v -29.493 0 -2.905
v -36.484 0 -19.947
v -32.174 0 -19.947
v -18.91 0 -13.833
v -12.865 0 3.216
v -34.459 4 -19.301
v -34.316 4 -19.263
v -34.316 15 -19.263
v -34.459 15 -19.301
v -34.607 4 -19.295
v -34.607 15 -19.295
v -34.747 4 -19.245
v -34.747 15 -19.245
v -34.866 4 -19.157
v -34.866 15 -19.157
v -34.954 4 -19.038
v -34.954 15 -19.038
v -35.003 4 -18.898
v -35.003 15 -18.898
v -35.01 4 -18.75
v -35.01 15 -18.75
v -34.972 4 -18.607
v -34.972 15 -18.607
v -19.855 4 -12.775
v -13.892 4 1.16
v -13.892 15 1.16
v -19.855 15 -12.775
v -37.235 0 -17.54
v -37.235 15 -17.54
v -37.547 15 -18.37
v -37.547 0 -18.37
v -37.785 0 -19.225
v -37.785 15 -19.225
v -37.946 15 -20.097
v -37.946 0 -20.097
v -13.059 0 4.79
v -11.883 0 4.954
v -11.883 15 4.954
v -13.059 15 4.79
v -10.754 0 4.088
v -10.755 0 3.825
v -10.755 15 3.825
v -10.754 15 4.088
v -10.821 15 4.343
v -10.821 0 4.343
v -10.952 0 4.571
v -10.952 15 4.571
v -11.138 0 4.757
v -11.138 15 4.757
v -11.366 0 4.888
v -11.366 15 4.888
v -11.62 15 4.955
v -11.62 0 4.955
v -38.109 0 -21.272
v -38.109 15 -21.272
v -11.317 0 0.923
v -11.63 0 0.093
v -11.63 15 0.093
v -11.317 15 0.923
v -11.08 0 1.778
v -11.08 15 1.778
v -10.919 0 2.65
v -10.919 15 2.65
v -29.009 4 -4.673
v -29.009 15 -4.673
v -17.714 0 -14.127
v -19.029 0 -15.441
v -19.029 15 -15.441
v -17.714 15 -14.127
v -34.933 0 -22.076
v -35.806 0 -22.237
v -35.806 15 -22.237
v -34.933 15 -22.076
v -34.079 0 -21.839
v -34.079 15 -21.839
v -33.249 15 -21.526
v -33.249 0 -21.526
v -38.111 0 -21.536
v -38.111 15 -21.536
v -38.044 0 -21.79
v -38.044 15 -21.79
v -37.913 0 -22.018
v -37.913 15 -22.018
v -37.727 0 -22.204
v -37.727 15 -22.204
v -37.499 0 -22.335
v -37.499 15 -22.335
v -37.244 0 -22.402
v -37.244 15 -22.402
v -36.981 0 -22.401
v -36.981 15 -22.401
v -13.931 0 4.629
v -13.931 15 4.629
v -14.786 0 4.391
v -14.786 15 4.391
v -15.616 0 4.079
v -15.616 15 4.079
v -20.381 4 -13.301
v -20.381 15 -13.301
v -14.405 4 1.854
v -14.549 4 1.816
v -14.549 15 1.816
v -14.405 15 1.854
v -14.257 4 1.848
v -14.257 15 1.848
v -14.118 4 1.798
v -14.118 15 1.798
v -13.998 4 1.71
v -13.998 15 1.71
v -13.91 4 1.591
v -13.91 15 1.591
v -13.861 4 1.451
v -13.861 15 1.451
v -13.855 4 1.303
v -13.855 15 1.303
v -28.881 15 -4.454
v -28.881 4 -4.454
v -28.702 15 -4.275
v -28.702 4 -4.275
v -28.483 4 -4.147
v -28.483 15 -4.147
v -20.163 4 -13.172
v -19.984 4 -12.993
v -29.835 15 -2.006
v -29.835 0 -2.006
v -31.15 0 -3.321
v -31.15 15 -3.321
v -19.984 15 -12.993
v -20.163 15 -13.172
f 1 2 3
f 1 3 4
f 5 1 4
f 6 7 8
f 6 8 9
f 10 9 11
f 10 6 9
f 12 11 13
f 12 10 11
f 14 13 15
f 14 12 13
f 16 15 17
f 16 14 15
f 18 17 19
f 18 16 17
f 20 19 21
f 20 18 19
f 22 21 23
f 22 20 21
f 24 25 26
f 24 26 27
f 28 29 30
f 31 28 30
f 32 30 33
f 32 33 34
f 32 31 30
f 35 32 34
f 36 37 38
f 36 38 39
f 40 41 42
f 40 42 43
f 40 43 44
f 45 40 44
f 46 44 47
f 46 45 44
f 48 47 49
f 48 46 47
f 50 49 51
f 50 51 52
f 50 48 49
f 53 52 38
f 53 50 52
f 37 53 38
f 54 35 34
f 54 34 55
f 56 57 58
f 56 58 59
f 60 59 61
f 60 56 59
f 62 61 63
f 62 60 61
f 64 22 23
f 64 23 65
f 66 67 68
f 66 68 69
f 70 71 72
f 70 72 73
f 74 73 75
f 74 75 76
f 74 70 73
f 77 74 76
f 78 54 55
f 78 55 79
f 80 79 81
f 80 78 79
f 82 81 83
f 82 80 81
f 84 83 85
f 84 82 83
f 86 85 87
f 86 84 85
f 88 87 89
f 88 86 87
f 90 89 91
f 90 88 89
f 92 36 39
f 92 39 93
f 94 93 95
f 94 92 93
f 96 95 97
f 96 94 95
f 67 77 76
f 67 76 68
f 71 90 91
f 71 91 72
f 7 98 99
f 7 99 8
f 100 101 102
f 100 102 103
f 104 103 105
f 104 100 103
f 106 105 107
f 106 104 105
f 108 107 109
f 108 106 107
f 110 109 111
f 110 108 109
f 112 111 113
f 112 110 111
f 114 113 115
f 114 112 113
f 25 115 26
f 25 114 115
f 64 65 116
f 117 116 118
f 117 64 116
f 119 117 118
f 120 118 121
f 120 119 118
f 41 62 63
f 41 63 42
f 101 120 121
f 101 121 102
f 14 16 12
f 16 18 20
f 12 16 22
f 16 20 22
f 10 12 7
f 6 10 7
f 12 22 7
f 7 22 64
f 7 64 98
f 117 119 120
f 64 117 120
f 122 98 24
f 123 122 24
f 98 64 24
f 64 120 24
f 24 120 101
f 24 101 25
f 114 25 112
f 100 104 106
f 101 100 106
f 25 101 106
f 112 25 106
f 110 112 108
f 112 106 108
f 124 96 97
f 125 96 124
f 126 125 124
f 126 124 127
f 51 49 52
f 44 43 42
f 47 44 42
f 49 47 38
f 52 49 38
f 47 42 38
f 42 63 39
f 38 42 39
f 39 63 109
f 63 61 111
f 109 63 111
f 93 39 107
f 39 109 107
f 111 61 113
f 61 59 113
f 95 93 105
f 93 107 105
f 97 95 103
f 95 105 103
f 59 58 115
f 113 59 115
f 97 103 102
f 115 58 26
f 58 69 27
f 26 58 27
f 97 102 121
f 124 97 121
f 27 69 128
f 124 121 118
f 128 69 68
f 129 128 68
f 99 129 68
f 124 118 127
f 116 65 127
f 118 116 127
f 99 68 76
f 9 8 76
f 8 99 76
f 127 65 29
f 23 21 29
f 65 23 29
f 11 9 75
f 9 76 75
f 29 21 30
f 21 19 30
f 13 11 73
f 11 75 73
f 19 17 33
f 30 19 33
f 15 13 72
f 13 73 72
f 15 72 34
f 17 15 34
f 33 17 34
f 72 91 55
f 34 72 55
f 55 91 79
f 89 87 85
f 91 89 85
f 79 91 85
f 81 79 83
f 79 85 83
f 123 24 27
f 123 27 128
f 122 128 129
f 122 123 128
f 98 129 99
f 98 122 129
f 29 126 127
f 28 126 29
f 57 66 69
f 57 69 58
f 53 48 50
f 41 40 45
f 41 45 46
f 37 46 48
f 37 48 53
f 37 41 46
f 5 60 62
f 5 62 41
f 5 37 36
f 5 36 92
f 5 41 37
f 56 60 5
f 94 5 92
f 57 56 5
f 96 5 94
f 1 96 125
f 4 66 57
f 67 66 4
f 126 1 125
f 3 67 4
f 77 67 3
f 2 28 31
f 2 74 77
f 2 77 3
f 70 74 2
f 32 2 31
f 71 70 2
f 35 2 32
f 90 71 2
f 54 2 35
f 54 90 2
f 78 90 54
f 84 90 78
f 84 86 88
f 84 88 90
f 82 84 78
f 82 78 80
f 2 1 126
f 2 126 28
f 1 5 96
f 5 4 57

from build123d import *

# Parameters (mm, degrees)
BOSS_EXTRUDE1_DEPTH = 15
BOSS_EXTRUDE2_START = -4
BOSS_EXTRUDE2_DEPTH = 4.000012


with BuildPart() as part:
    # Sketch1 → Boss-Extrude1 (new body)
    with BuildSketch(Plane(origin=(0, 0, 0), x_dir=(1, 0, 0), z_dir=(0, 1, 0))):
        with BuildLine():
            Line((-33.248720492, 21.52614432), (-19.029308571, 15.44140741))
            Line((-19.029308571, 15.44140741), (-17.714430818, 14.126529658))
            Line((-17.714430818, 14.126529658), (-11.629693909, -0.092882264))
            ThreePointArc((-11.629693909, -0.092882264), (-11.188945491, -1.347659996), (-10.918602777, -2.649827859))
            Line((-10.918602777, -2.649827859), (-10.755160033, -3.825322261))
            ThreePointArc((-10.755160033, -3.825322261), (-11.038524889, -4.670145906), (-11.883348535, -4.953510763))
            Line((-11.883348535, -4.953510763), (-13.058842937, -4.790068018))
            ThreePointArc((-13.058842937, -4.790068018), (-14.361010799, -4.519725304), (-15.615788532, -4.078976887))
            Line((-15.615788532, -4.078976887), (-29.835200454, 2.005760022))
            Line((-29.835200454, 2.005760022), (-31.150078206, 3.320637775))
            Line((-31.150078206, 3.320637775), (-37.234815116, 17.540049697))
            ThreePointArc((-37.234815116, 17.540049697), (-37.675563533, 18.794827429), (-37.945906247, 20.096995292))
            Line((-37.945906247, 20.096995292), (-38.109348992, 21.272489694))
            ThreePointArc((-38.109348992, 21.272489694), (-37.825984135, 22.117313339), (-36.98116049, 22.400678196))
            Line((-36.98116049, 22.400678196), (-35.805666088, 22.237235451))
            ThreePointArc((-35.805666088, 22.237235451), (-34.503498225, 21.966892737), (-33.248720492, 21.52614432))
        make_face()
        with BuildLine():
            Line((-34.972142842, 18.607085072), (-29.009288651, 4.672500679))
            ThreePointArc((-29.009288651, 4.672500679), (-28.797032907, 4.358805321), (-28.48333755, 4.146549578))
            Line((-28.48333755, 4.146549578), (-14.548753156, -1.816304613))
            ThreePointArc((-14.548753156, -1.816304613), (-13.998494054, -1.710176742), (-13.892366182, -1.159917639))
            Line((-13.892366182, -1.159917639), (-19.855220374, 12.774666754))
            ThreePointArc((-19.855220374, 12.774666754), (-20.067476117, 13.088362112), (-20.381171475, 13.300617855))
            Line((-20.381171475, 13.300617855), (-34.315755868, 19.263472046))
            ThreePointArc((-34.315755868, 19.263472046), (-34.86601497, 19.157344174), (-34.972142842, 18.607085072))
        make_face(mode=Mode.SUBTRACT)
    extrude(amount=BOSS_EXTRUDE1_DEPTH)

    # Sketch2 → Boss-Extrude2 (add)
    with BuildSketch(Plane.XZ.offset(BOSS_EXTRUDE2_START)):
        Polygon((-12.865216707, 3.215805982), (-29.492692689, -2.90528144), (-36.484014197, -19.947497419), (-32.173846311, -19.947497419), (-18.909952053, -13.83296991), align=None)
    extrude(amount=BOSS_EXTRUDE2_DEPTH)


solid = part.part
